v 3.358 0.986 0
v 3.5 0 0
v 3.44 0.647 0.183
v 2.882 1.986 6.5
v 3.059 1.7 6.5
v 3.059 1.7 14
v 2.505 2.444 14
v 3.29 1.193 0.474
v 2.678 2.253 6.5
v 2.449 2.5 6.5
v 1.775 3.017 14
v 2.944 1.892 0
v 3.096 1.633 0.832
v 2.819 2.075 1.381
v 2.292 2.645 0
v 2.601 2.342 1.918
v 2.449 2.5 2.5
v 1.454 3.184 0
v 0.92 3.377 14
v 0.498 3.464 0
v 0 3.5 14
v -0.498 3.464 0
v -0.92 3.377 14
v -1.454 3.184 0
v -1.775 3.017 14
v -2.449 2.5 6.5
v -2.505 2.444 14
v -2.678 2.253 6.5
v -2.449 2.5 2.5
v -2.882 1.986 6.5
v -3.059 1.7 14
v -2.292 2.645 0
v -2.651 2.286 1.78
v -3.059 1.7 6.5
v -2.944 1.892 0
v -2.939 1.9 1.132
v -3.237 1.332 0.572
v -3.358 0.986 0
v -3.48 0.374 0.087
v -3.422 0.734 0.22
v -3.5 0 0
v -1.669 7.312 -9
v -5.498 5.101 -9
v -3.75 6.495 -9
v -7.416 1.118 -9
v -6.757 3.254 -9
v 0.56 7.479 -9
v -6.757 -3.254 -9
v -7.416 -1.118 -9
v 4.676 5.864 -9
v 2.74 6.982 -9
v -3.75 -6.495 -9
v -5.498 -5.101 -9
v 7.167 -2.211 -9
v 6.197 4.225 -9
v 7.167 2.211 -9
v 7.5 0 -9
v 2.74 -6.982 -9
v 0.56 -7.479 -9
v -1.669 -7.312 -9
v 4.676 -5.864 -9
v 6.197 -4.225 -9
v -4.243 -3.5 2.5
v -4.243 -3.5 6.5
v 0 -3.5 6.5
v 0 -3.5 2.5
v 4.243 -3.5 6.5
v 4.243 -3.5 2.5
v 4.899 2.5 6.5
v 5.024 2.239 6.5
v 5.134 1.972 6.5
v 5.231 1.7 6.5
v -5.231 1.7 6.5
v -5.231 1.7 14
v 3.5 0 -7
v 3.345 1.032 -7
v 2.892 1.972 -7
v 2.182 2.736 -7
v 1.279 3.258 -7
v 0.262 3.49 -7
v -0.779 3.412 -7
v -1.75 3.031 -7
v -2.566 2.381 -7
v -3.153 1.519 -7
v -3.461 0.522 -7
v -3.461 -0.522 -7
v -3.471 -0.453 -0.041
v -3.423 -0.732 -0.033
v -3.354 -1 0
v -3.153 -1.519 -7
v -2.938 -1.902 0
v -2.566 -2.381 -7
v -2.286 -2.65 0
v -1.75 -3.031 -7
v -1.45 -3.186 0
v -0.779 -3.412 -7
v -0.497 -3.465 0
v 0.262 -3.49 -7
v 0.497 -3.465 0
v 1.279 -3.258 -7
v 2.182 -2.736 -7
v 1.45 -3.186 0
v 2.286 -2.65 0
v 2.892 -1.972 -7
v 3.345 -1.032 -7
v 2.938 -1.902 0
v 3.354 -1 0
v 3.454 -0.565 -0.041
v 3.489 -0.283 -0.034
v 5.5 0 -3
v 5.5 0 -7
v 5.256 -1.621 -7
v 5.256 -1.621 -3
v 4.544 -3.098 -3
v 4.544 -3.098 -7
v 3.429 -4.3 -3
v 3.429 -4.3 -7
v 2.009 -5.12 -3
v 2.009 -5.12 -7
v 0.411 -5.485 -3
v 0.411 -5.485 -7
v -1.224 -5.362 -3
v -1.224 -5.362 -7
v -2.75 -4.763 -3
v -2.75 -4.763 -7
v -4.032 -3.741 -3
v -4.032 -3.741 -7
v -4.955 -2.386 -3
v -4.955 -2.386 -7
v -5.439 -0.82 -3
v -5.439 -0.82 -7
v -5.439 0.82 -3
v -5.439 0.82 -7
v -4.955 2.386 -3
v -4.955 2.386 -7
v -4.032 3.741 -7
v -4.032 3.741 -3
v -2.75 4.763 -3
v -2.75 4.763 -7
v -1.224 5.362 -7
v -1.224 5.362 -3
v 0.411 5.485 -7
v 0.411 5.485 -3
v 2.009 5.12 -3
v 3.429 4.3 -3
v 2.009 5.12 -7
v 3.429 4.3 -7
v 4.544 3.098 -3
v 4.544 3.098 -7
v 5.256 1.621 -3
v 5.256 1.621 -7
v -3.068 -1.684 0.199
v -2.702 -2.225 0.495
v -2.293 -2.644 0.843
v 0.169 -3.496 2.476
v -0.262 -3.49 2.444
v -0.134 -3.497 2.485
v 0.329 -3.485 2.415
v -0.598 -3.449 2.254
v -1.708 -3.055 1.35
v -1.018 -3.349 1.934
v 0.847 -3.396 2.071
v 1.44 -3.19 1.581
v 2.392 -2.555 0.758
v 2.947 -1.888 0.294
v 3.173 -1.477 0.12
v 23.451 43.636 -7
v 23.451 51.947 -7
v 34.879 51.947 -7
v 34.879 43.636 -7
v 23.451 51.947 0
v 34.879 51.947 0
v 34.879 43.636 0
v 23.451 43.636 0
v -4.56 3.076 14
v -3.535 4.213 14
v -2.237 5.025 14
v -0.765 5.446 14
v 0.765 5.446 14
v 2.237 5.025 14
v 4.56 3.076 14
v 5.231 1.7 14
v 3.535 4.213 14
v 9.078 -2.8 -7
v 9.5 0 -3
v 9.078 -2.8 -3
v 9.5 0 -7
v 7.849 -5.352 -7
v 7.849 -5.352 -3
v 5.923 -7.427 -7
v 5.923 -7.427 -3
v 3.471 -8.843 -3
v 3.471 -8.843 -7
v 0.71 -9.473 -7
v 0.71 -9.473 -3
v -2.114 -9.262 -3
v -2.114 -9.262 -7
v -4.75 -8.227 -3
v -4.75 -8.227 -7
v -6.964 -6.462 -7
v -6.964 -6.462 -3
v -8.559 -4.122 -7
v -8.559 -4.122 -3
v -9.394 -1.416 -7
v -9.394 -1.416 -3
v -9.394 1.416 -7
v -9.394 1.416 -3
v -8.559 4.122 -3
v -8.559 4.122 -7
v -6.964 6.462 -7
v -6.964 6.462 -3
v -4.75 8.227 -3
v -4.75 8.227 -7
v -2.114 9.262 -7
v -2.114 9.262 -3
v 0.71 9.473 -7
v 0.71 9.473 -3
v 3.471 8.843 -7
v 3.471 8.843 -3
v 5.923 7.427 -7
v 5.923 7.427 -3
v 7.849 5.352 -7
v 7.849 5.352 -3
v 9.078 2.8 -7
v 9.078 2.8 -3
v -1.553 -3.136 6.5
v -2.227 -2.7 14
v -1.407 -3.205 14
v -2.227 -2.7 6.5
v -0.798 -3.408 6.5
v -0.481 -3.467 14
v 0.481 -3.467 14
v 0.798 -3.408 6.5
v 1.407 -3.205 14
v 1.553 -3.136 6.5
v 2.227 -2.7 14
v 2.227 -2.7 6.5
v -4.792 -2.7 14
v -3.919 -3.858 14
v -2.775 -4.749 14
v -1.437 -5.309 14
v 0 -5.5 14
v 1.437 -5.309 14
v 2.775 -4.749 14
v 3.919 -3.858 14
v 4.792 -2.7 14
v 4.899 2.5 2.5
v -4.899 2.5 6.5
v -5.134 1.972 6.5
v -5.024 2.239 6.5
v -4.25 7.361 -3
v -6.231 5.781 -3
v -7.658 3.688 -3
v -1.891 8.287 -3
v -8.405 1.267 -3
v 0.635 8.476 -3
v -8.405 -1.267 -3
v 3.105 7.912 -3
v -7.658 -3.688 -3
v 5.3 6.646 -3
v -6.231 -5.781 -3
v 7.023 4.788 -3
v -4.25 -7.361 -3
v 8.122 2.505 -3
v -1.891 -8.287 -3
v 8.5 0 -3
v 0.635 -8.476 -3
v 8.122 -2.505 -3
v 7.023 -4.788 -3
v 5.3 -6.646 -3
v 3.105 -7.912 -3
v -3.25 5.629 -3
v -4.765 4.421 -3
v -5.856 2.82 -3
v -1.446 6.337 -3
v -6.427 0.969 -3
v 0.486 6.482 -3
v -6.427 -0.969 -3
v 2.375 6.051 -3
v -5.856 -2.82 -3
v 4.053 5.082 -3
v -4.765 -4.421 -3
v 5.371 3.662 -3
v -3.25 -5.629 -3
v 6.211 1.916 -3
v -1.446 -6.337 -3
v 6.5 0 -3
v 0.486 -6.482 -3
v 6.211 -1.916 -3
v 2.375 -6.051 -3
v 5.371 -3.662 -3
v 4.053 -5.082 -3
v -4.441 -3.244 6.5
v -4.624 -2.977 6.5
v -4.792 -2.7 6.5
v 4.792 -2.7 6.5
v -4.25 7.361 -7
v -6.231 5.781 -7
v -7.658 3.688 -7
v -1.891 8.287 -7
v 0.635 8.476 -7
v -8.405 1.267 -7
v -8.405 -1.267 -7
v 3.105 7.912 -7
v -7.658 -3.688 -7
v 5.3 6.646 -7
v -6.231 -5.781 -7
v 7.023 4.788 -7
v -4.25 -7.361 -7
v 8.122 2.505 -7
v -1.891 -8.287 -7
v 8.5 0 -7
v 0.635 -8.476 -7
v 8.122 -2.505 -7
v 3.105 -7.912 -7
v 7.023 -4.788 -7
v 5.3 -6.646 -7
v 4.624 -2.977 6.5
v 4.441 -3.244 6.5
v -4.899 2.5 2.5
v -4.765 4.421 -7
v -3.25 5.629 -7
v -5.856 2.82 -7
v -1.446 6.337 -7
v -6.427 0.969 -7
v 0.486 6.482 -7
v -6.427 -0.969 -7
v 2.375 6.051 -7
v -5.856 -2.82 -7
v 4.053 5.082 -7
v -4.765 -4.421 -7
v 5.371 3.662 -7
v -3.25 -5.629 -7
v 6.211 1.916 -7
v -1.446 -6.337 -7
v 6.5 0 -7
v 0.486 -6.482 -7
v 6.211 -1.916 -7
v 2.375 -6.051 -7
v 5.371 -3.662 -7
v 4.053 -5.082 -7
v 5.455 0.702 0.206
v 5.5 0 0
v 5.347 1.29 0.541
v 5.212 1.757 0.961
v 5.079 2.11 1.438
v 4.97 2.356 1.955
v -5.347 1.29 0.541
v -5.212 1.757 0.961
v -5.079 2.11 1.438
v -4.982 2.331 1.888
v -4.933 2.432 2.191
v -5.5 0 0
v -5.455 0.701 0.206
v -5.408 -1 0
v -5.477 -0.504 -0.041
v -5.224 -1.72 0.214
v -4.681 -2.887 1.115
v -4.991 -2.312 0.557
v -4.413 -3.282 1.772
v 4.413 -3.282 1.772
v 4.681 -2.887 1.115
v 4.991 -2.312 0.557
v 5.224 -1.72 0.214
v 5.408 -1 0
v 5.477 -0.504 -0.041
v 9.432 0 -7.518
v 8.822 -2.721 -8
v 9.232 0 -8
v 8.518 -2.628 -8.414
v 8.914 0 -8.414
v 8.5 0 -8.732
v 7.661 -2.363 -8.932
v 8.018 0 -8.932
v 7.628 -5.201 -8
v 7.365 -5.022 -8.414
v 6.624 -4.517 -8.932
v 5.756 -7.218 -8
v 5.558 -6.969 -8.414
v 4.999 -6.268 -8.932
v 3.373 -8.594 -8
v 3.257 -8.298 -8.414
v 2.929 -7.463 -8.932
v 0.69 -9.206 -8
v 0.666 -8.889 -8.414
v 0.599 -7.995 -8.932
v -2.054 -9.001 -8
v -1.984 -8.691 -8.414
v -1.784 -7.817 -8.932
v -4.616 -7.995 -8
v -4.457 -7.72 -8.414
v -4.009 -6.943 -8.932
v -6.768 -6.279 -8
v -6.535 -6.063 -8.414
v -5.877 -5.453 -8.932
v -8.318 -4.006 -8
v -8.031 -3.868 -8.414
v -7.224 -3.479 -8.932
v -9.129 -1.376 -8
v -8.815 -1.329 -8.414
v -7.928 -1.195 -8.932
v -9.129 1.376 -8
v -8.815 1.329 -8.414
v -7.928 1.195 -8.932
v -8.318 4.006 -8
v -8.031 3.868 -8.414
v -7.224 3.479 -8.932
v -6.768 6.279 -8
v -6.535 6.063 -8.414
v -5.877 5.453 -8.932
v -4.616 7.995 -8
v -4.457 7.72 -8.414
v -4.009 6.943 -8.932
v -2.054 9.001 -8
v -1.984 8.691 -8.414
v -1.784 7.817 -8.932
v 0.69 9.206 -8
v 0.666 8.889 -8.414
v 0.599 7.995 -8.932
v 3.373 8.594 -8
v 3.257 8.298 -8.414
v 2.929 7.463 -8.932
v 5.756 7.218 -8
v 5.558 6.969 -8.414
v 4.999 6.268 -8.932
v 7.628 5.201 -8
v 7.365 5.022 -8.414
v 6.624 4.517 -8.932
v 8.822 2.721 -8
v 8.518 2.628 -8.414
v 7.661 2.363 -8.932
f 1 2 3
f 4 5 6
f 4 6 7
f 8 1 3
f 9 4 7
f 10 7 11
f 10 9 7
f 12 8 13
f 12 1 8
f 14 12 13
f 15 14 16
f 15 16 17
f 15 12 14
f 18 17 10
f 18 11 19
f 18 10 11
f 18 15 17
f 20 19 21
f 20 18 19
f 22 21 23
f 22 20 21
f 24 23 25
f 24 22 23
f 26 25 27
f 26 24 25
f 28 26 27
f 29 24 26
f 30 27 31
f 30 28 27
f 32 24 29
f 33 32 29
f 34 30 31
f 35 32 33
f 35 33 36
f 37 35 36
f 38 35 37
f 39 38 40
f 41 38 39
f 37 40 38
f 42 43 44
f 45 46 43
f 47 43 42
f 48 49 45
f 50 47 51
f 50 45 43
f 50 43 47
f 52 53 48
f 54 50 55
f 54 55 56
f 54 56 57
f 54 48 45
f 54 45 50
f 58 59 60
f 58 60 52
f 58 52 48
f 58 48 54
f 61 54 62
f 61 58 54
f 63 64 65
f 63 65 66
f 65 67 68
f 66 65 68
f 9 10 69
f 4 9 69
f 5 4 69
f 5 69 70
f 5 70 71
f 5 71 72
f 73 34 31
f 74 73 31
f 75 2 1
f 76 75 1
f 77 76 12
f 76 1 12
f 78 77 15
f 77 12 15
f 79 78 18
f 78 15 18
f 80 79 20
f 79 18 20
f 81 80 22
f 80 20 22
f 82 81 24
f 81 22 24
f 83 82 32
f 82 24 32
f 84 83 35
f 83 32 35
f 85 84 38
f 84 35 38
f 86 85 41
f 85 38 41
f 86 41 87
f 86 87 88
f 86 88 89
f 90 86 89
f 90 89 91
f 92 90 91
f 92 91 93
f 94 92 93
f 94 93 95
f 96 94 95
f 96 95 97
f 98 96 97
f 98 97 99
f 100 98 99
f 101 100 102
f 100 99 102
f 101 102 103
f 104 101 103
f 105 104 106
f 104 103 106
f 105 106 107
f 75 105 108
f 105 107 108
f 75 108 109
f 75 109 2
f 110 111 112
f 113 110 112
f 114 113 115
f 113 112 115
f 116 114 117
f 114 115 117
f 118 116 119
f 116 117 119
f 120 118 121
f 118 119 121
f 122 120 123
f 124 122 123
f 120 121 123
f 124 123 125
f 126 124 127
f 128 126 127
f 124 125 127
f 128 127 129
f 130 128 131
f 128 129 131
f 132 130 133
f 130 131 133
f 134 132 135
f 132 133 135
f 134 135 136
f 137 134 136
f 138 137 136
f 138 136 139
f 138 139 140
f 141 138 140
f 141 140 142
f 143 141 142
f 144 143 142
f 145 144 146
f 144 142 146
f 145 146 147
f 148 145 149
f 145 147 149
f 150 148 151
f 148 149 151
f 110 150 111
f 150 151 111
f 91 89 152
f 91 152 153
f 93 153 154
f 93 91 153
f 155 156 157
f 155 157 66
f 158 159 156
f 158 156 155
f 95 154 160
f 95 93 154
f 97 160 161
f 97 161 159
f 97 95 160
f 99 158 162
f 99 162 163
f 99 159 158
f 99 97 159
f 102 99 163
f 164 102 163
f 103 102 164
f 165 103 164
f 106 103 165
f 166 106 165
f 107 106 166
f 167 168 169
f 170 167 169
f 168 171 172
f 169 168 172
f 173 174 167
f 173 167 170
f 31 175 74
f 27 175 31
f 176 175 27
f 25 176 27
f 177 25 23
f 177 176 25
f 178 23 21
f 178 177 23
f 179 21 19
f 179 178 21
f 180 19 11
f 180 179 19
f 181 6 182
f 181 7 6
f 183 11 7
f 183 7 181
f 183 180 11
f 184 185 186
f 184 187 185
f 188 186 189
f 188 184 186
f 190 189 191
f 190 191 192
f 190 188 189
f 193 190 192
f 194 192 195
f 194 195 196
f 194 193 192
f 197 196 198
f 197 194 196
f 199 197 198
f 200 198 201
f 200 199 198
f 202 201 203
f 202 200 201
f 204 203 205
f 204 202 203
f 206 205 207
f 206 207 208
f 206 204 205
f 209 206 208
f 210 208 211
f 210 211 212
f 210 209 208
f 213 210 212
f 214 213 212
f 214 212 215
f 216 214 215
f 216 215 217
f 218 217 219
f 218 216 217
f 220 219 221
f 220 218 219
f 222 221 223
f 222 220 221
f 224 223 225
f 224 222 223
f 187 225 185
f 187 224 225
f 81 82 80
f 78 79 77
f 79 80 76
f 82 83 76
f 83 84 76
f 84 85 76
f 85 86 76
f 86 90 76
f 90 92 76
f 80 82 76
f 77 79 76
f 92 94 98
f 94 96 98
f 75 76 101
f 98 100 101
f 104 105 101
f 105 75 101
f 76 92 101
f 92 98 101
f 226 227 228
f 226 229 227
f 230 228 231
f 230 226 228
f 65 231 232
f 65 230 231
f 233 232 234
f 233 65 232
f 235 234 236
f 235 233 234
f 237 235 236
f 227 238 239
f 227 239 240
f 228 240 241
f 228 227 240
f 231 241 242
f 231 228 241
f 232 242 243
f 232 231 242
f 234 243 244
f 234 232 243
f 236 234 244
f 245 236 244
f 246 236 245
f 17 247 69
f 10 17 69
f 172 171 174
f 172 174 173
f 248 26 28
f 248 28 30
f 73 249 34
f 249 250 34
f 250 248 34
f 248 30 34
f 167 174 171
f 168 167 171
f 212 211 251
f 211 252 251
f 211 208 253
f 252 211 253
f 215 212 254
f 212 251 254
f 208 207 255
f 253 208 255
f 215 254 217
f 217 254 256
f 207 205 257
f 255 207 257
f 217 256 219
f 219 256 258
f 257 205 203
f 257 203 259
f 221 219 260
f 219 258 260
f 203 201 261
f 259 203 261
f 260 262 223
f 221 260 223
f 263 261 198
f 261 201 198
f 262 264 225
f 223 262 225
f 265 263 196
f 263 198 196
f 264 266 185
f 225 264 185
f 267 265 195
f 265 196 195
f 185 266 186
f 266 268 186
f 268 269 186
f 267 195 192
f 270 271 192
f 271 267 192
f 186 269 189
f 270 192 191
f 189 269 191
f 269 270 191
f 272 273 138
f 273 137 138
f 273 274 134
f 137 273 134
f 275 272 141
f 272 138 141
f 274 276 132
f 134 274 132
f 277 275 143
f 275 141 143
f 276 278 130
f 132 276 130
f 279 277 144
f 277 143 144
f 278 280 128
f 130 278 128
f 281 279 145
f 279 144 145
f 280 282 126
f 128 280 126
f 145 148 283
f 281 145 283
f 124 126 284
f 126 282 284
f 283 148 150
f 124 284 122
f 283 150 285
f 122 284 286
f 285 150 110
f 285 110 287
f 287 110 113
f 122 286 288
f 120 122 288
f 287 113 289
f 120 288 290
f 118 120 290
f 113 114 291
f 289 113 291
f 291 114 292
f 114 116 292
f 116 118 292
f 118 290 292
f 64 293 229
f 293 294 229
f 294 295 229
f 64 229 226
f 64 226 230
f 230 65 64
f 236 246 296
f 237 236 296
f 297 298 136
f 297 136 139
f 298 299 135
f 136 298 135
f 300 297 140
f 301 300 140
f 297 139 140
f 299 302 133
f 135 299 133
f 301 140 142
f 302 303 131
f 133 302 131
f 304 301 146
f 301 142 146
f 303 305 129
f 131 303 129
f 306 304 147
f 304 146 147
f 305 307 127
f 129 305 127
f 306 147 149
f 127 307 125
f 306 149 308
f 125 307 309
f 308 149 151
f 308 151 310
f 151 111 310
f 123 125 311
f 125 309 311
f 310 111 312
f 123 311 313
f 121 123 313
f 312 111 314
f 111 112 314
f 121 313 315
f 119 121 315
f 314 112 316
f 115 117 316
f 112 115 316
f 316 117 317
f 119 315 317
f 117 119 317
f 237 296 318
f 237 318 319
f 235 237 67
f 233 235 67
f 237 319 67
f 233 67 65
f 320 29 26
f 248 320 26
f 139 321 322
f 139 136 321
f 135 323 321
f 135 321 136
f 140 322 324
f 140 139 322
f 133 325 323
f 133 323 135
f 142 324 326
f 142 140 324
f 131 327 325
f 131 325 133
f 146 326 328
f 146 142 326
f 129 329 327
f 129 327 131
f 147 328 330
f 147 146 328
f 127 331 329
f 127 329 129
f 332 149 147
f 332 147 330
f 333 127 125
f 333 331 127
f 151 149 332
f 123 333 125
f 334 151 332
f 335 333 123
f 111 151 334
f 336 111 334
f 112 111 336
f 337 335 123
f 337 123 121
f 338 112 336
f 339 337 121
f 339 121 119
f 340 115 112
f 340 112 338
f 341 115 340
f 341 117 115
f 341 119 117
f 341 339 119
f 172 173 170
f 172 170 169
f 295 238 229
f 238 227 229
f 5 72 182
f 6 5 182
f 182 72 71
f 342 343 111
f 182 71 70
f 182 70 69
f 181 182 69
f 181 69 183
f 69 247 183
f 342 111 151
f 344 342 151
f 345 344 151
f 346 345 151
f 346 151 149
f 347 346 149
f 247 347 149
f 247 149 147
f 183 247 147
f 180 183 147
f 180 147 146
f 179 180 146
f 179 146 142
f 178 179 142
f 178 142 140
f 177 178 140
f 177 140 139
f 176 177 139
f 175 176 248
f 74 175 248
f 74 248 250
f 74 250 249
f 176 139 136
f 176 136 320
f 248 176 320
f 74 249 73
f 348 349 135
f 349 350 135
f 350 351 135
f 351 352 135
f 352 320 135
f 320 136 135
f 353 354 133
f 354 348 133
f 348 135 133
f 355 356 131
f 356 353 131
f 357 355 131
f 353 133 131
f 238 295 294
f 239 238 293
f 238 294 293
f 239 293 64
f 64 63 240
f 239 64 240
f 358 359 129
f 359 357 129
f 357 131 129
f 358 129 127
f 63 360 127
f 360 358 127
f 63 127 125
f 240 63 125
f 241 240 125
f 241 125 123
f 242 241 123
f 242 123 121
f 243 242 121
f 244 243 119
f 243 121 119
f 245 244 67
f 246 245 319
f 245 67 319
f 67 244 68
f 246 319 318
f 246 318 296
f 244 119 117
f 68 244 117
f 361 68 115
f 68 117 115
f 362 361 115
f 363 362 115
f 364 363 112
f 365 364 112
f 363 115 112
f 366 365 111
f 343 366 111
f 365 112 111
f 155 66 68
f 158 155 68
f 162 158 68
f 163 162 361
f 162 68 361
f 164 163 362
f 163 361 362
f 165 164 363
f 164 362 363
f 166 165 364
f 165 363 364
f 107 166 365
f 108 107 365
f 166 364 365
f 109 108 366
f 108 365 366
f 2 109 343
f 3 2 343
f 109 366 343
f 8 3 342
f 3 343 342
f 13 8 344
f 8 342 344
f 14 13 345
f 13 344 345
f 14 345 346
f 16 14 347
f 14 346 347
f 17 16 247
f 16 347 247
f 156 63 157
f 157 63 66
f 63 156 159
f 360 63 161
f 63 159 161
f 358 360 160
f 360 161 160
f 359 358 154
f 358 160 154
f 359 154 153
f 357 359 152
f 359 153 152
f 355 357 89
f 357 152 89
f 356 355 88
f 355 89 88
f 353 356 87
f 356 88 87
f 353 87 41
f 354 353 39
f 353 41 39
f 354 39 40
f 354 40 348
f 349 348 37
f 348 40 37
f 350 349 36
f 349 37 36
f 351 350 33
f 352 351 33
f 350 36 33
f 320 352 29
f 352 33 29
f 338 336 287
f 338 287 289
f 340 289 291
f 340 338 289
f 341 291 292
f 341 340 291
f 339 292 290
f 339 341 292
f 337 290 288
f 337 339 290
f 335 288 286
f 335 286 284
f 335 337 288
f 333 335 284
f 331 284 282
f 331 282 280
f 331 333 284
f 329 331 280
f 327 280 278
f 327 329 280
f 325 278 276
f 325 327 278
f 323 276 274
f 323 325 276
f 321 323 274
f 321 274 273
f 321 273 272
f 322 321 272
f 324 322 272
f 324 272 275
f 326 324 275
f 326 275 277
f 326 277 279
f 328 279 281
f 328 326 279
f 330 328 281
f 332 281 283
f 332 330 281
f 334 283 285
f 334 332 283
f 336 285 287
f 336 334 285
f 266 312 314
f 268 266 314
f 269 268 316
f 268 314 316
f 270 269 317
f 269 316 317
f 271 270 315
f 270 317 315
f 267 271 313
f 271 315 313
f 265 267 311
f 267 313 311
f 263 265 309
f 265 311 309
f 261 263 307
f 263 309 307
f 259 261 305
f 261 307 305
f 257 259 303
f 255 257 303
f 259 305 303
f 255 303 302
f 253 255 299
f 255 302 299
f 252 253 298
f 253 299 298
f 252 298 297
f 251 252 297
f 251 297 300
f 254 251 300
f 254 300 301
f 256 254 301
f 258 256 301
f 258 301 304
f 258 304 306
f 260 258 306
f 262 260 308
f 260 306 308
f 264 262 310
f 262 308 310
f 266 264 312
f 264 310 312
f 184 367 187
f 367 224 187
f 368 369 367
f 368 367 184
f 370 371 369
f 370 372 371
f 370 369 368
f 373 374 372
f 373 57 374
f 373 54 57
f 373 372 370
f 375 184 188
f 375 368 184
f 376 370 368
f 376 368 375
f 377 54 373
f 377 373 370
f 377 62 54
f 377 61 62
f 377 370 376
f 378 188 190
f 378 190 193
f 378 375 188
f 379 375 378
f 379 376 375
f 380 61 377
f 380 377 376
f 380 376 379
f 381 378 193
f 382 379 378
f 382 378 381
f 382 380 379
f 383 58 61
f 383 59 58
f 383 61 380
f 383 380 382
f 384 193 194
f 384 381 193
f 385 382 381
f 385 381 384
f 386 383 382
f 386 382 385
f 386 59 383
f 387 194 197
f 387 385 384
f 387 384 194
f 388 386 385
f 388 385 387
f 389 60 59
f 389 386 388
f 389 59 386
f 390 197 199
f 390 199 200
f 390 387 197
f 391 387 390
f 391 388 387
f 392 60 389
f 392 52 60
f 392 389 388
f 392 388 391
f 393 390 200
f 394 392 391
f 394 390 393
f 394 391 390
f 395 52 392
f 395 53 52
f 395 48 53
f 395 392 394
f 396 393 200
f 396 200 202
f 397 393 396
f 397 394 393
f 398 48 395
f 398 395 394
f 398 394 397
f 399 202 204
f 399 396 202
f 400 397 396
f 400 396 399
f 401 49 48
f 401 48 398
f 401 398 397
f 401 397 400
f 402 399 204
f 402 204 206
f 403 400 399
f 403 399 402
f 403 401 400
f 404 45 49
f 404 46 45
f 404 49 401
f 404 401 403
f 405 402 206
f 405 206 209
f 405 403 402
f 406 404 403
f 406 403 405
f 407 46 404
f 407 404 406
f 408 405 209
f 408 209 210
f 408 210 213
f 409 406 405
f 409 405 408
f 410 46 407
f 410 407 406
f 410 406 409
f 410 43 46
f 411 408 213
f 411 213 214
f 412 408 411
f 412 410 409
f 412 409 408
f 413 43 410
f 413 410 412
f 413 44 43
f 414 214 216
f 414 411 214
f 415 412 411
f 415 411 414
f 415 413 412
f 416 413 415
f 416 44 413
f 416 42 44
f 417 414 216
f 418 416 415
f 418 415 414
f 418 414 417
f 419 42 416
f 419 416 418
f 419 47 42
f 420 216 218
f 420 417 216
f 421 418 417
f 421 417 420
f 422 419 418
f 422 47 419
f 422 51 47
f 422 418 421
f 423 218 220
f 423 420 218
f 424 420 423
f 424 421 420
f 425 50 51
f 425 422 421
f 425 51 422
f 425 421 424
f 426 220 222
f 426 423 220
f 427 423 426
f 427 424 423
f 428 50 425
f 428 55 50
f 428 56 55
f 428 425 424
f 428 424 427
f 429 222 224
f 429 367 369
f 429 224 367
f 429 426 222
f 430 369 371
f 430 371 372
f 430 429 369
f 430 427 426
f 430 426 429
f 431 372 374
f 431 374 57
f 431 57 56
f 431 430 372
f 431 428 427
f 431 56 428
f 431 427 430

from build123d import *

# Parameters (mm, degrees)
F1_W      = 11.4284157753
F1_H      = 8.3115845919
F2_DEPTH  = 7
F4_R      = 9.5
F4_R_2    = 6.5
F4_R_3    = 5.5
F5_DEPTH  = 2
F0_R      = 5.5
F0_R_2    = 3.5
F6_DEPTH  = 7
F7_DEPTH  = 14
F8_DEPTH  = 12.5
F9_R      = 1.99999
F10_R     = 9.5
F10_R_2   = 8.5
F11_DEPTH = 4
F12_DEPTH = 4


# Not quite as in the source:
# - a fillet or chamfer is up to 0.001 mm smaller than in the source, because OpenCascade refuses the exact size


with BuildPart() as f2:
    # F1 (on Top) → F2 (new body)
    with BuildSketch(Plane.XY):
        with Locations((29.1647613049, 47.7915927768)):
            Rectangle(F1_W, F1_H)
    extrude(amount=-F2_DEPTH)


with BuildPart() as f5:
    # F4 (on face) → F5 (new body)
    with BuildSketch(Plane(origin=(0, 0, -7), x_dir=(1, 0, 0), z_dir=(0, 0, -1))):
        Circle(F4_R)
        Circle(F4_R_2, mode=Mode.SUBTRACT)
        Circle(F4_R_2)
        Circle(F4_R_3, mode=Mode.SUBTRACT)
        Circle(F4_R_3)
    extrude(amount=F5_DEPTH)

    # F0 (on Top) → F6 (join)
    with BuildSketch(Plane.XY):
        Circle(F0_R)
        Circle(F0_R_2, mode=Mode.SUBTRACT)
    extrude(amount=-F6_DEPTH)

    # F7 (add): a face of the model
    f7_faces = [f5.faces().sort_by_distance(p)[0] for p in [
        (-5.3444365081, 0, 0),
    ]]
    extrude(f7_faces, amount=F7_DEPTH)

    # F3 (on Right) → F8 (cut, symmetric)
    with BuildSketch(Plane.YZ):
        with BuildLine():
            Line((1.7, 17), (-2.7, 17))
            Line((-2.7, 17), (-2.7, 6.5))
            Line((-2.7, 6.5), (-3.5, 6.5))
            Line((-3.5, 6.5), (-3.5, 2.5))
            ThreePointArc((-3.5, 2.5), (-0.5, -0.0413812651), (2.5, 2.5))
            Line((2.5, 2.5), (2.5, 6.5))
            Line((2.5, 6.5), (1.7, 6.5))
            Line((1.7, 6.5), (1.7, 17))
        make_face()
    extrude(amount=F8_DEPTH, both=True, mode=Mode.SUBTRACT)

    # F9 (radius 2 in the source; OpenCascade refuses exactly that, so slightly less here)
    f9_edges = [f5.edges().sort_by_distance(p)[0] for p in [
        (-9.5, 0, -9),
    ]]
    fillet(f9_edges, radius=F9_R)

    # F10 (on face) → F11 (join)
    with BuildSketch(Plane(origin=(0, 0, -7), x_dir=(1, 0, 0), z_dir=(0, 0, -1))):
        Circle(F10_R)
        Circle(F10_R_2, mode=Mode.SUBTRACT)
    extrude(amount=-F11_DEPTH)


with BuildPart() as f12:
    # F4 (on face) → F12 (new body)
    with BuildSketch(Plane(origin=(0, 0, -7), x_dir=(1, 0, 0), z_dir=(0, 0, -1))):
        Circle(F4_R_2)
        Circle(F4_R_3, mode=Mode.SUBTRACT)
    extrude(amount=-F12_DEPTH)


solid = Compound([f2.part, f5.part, f12.part])
